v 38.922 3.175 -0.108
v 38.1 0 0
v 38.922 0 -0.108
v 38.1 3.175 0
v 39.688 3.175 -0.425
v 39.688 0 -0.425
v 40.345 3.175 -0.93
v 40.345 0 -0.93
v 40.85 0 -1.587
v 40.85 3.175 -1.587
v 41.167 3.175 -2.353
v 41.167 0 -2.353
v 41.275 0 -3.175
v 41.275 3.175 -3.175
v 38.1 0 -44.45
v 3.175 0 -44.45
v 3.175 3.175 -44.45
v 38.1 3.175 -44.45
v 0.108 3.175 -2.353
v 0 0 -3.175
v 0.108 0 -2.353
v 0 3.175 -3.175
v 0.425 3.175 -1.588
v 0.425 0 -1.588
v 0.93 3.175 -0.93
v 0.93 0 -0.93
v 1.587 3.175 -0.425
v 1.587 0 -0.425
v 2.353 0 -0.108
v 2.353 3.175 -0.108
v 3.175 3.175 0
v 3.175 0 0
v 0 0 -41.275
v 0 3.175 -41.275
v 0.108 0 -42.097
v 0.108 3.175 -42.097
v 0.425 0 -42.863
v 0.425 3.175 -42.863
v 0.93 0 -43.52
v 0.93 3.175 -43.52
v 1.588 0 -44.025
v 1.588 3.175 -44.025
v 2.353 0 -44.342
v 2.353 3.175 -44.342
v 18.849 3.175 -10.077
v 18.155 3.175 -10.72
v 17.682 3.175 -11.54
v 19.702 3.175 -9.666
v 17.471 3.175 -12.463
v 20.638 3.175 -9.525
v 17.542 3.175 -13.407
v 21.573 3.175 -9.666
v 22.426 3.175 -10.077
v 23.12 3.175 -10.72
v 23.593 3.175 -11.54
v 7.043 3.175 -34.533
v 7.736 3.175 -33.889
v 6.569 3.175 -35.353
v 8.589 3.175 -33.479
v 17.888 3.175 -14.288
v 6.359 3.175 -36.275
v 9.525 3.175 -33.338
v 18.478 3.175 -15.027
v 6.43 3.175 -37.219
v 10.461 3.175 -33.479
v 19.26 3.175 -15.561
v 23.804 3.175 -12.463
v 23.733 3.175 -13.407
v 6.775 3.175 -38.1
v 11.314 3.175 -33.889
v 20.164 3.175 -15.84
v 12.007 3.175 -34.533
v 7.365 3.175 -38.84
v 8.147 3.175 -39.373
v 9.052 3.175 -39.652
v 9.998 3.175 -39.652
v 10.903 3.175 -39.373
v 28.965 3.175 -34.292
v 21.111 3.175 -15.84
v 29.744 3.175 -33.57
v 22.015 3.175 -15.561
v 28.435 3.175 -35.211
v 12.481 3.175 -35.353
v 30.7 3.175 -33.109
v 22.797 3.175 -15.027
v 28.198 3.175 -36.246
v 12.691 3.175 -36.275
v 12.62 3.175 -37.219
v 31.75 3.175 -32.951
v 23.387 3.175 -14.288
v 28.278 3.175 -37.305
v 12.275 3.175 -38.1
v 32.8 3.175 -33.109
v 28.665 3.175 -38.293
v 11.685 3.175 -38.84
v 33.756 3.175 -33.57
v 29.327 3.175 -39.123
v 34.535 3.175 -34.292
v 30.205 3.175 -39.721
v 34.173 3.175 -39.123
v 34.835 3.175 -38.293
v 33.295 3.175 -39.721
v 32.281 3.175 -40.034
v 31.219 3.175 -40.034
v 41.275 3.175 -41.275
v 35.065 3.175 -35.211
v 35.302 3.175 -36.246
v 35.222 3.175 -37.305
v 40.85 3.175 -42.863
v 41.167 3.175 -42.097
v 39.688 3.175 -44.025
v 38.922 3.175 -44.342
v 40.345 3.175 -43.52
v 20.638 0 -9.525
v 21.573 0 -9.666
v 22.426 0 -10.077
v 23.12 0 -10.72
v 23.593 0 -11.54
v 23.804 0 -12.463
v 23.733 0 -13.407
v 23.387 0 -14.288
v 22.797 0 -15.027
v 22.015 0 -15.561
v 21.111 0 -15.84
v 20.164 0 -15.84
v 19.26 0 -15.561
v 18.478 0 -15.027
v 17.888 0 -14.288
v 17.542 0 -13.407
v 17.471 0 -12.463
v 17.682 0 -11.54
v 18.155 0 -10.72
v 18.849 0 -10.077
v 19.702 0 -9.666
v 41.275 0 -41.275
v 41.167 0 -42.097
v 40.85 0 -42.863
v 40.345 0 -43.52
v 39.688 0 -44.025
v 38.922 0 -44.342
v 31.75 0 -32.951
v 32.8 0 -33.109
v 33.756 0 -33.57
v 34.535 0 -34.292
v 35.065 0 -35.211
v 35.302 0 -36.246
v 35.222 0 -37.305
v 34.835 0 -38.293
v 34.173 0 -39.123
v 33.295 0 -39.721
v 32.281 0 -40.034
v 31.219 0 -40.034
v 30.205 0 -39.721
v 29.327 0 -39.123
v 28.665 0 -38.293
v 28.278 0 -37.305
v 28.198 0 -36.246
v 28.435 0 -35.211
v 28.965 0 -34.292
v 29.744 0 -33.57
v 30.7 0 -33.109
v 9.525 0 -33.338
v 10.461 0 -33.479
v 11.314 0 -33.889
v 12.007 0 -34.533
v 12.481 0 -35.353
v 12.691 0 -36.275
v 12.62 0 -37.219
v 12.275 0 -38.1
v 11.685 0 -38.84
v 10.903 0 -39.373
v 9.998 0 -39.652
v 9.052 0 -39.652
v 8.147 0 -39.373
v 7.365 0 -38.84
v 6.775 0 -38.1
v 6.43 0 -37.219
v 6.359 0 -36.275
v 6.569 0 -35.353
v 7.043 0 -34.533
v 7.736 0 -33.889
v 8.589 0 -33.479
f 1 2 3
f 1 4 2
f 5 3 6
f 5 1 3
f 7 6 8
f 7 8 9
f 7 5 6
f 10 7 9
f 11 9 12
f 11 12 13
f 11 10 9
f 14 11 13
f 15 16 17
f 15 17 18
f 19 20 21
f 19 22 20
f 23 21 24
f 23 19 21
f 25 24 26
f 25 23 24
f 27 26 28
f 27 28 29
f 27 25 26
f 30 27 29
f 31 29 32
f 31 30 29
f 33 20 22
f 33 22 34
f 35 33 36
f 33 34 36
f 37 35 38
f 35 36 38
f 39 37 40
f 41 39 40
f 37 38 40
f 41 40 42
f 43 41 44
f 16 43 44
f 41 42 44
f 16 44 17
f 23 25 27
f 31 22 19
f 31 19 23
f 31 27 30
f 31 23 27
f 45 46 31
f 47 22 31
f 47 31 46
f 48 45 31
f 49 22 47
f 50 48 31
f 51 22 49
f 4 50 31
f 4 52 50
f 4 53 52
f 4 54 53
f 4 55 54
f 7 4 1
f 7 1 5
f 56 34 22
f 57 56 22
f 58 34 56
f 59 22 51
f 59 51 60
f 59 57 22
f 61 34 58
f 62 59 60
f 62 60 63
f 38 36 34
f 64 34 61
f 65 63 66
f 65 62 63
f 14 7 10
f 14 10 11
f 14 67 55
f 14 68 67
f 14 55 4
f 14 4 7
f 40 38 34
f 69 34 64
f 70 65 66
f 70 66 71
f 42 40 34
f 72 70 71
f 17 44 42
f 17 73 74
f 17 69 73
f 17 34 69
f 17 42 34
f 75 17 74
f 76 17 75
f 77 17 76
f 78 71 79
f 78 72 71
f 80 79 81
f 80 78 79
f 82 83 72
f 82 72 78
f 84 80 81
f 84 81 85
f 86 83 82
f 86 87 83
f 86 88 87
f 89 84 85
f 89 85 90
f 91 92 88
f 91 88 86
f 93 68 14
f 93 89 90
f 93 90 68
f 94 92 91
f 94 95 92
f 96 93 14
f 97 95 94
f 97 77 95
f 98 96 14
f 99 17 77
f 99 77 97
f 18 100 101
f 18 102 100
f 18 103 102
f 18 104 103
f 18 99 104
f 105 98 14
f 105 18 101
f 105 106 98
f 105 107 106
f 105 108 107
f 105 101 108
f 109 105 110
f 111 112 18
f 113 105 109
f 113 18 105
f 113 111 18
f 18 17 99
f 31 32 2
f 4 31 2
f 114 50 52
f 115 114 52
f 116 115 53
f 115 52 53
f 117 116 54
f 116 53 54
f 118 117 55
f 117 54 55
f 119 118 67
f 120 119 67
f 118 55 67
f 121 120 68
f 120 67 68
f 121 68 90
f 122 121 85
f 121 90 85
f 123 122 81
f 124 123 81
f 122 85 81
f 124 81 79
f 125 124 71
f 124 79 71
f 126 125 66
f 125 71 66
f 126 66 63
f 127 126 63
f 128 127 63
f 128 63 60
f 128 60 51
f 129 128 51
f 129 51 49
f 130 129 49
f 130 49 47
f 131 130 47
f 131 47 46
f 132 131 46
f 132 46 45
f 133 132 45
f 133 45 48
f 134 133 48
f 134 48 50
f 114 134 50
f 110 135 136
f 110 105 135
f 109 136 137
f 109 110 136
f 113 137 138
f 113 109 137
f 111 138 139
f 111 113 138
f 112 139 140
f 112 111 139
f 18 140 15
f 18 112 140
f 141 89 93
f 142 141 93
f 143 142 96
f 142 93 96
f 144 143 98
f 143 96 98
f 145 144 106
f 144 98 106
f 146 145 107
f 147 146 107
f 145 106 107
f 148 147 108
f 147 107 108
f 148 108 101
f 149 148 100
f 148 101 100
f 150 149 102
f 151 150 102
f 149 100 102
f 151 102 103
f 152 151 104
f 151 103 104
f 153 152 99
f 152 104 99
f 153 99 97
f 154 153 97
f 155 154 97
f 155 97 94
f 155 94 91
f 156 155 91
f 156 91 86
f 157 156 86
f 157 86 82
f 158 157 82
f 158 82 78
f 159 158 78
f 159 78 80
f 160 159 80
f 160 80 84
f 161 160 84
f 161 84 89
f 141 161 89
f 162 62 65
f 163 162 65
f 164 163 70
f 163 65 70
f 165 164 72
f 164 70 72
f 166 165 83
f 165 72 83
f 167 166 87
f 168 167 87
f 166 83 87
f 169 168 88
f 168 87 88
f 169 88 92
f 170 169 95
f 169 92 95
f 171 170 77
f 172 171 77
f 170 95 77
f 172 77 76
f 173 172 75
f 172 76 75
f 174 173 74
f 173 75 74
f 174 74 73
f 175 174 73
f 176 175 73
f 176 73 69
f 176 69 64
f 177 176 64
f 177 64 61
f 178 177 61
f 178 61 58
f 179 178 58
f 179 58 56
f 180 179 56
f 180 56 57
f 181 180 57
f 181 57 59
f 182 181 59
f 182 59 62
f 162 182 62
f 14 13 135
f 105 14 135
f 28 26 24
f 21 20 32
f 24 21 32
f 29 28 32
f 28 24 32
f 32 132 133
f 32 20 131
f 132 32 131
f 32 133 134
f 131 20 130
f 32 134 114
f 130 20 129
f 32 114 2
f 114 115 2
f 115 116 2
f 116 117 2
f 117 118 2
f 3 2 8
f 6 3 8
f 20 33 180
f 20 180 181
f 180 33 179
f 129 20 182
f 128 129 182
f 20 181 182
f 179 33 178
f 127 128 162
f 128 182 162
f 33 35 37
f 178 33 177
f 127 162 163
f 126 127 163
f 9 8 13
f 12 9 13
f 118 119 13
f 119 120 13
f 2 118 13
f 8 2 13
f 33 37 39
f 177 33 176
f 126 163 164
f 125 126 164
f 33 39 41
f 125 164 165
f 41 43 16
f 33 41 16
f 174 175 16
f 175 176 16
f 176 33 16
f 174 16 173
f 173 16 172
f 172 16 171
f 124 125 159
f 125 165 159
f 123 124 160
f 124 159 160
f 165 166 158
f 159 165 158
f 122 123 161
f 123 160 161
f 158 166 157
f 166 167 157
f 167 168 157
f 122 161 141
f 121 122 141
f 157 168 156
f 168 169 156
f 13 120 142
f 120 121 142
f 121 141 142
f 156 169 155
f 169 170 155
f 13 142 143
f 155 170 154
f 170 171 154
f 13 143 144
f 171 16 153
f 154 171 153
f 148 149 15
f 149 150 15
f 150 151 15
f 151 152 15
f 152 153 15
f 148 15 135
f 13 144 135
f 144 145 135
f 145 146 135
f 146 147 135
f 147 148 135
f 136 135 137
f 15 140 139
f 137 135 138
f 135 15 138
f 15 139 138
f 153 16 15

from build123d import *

# Parameters (mm, degrees)
SKETCH1_W           = 41.275
SKETCH1_H           = 44.45
BOSS_EXTRUDE1_DEPTH = 3.175
FILLET1_R           = 3.175
SKETCH2_R           = 3.175
SKETCH2_R_2         = 3.561696706
CUT_EXTRUDE1_DEPTH  = 61.741326541


with BuildPart() as part:
    # Sketch1 → Boss-Extrude1 (new body)
    with BuildSketch(Plane(origin=(0, 0, 0), x_dir=(1, 0, 0), z_dir=(0, 1, 0))):
        with Locations((20.6375, 22.225)):
            Rectangle(SKETCH1_W, SKETCH1_H)
    extrude(amount=BOSS_EXTRUDE1_DEPTH)

    # Fillet1
    fillet1_edges = [part.edges().sort_by_distance(p)[0] for p in [
        (0, 1.5875, -44.45),
        (41.275, 1.5875, -44.45),
        (41.275, 1.5875, 0),
        (0, 1.5875, 0),
    ]]
    fillet(fillet1_edges, radius=FILLET1_R)

    # Sketch2 → Cut-Extrude1 (cut, through all)
    with BuildSketch(Plane(origin=(0, 3.175, 0), x_dir=(1, 0, 0), z_dir=(0, 1, 0))):
        with Locations(Location((9.525, 36.5125, 0), (0, 0, 270))):
            Circle(SKETCH2_R)
        with Locations(Location((31.75, 36.5125, 0), (0, 0, 270))):
            Circle(SKETCH2_R_2)
        with Locations(Location((20.6375, 12.7, 0), (0, 0, 270))):
            Circle(SKETCH2_R)
    extrude(amount=-CUT_EXTRUDE1_DEPTH, mode=Mode.SUBTRACT)


solid = part.part
